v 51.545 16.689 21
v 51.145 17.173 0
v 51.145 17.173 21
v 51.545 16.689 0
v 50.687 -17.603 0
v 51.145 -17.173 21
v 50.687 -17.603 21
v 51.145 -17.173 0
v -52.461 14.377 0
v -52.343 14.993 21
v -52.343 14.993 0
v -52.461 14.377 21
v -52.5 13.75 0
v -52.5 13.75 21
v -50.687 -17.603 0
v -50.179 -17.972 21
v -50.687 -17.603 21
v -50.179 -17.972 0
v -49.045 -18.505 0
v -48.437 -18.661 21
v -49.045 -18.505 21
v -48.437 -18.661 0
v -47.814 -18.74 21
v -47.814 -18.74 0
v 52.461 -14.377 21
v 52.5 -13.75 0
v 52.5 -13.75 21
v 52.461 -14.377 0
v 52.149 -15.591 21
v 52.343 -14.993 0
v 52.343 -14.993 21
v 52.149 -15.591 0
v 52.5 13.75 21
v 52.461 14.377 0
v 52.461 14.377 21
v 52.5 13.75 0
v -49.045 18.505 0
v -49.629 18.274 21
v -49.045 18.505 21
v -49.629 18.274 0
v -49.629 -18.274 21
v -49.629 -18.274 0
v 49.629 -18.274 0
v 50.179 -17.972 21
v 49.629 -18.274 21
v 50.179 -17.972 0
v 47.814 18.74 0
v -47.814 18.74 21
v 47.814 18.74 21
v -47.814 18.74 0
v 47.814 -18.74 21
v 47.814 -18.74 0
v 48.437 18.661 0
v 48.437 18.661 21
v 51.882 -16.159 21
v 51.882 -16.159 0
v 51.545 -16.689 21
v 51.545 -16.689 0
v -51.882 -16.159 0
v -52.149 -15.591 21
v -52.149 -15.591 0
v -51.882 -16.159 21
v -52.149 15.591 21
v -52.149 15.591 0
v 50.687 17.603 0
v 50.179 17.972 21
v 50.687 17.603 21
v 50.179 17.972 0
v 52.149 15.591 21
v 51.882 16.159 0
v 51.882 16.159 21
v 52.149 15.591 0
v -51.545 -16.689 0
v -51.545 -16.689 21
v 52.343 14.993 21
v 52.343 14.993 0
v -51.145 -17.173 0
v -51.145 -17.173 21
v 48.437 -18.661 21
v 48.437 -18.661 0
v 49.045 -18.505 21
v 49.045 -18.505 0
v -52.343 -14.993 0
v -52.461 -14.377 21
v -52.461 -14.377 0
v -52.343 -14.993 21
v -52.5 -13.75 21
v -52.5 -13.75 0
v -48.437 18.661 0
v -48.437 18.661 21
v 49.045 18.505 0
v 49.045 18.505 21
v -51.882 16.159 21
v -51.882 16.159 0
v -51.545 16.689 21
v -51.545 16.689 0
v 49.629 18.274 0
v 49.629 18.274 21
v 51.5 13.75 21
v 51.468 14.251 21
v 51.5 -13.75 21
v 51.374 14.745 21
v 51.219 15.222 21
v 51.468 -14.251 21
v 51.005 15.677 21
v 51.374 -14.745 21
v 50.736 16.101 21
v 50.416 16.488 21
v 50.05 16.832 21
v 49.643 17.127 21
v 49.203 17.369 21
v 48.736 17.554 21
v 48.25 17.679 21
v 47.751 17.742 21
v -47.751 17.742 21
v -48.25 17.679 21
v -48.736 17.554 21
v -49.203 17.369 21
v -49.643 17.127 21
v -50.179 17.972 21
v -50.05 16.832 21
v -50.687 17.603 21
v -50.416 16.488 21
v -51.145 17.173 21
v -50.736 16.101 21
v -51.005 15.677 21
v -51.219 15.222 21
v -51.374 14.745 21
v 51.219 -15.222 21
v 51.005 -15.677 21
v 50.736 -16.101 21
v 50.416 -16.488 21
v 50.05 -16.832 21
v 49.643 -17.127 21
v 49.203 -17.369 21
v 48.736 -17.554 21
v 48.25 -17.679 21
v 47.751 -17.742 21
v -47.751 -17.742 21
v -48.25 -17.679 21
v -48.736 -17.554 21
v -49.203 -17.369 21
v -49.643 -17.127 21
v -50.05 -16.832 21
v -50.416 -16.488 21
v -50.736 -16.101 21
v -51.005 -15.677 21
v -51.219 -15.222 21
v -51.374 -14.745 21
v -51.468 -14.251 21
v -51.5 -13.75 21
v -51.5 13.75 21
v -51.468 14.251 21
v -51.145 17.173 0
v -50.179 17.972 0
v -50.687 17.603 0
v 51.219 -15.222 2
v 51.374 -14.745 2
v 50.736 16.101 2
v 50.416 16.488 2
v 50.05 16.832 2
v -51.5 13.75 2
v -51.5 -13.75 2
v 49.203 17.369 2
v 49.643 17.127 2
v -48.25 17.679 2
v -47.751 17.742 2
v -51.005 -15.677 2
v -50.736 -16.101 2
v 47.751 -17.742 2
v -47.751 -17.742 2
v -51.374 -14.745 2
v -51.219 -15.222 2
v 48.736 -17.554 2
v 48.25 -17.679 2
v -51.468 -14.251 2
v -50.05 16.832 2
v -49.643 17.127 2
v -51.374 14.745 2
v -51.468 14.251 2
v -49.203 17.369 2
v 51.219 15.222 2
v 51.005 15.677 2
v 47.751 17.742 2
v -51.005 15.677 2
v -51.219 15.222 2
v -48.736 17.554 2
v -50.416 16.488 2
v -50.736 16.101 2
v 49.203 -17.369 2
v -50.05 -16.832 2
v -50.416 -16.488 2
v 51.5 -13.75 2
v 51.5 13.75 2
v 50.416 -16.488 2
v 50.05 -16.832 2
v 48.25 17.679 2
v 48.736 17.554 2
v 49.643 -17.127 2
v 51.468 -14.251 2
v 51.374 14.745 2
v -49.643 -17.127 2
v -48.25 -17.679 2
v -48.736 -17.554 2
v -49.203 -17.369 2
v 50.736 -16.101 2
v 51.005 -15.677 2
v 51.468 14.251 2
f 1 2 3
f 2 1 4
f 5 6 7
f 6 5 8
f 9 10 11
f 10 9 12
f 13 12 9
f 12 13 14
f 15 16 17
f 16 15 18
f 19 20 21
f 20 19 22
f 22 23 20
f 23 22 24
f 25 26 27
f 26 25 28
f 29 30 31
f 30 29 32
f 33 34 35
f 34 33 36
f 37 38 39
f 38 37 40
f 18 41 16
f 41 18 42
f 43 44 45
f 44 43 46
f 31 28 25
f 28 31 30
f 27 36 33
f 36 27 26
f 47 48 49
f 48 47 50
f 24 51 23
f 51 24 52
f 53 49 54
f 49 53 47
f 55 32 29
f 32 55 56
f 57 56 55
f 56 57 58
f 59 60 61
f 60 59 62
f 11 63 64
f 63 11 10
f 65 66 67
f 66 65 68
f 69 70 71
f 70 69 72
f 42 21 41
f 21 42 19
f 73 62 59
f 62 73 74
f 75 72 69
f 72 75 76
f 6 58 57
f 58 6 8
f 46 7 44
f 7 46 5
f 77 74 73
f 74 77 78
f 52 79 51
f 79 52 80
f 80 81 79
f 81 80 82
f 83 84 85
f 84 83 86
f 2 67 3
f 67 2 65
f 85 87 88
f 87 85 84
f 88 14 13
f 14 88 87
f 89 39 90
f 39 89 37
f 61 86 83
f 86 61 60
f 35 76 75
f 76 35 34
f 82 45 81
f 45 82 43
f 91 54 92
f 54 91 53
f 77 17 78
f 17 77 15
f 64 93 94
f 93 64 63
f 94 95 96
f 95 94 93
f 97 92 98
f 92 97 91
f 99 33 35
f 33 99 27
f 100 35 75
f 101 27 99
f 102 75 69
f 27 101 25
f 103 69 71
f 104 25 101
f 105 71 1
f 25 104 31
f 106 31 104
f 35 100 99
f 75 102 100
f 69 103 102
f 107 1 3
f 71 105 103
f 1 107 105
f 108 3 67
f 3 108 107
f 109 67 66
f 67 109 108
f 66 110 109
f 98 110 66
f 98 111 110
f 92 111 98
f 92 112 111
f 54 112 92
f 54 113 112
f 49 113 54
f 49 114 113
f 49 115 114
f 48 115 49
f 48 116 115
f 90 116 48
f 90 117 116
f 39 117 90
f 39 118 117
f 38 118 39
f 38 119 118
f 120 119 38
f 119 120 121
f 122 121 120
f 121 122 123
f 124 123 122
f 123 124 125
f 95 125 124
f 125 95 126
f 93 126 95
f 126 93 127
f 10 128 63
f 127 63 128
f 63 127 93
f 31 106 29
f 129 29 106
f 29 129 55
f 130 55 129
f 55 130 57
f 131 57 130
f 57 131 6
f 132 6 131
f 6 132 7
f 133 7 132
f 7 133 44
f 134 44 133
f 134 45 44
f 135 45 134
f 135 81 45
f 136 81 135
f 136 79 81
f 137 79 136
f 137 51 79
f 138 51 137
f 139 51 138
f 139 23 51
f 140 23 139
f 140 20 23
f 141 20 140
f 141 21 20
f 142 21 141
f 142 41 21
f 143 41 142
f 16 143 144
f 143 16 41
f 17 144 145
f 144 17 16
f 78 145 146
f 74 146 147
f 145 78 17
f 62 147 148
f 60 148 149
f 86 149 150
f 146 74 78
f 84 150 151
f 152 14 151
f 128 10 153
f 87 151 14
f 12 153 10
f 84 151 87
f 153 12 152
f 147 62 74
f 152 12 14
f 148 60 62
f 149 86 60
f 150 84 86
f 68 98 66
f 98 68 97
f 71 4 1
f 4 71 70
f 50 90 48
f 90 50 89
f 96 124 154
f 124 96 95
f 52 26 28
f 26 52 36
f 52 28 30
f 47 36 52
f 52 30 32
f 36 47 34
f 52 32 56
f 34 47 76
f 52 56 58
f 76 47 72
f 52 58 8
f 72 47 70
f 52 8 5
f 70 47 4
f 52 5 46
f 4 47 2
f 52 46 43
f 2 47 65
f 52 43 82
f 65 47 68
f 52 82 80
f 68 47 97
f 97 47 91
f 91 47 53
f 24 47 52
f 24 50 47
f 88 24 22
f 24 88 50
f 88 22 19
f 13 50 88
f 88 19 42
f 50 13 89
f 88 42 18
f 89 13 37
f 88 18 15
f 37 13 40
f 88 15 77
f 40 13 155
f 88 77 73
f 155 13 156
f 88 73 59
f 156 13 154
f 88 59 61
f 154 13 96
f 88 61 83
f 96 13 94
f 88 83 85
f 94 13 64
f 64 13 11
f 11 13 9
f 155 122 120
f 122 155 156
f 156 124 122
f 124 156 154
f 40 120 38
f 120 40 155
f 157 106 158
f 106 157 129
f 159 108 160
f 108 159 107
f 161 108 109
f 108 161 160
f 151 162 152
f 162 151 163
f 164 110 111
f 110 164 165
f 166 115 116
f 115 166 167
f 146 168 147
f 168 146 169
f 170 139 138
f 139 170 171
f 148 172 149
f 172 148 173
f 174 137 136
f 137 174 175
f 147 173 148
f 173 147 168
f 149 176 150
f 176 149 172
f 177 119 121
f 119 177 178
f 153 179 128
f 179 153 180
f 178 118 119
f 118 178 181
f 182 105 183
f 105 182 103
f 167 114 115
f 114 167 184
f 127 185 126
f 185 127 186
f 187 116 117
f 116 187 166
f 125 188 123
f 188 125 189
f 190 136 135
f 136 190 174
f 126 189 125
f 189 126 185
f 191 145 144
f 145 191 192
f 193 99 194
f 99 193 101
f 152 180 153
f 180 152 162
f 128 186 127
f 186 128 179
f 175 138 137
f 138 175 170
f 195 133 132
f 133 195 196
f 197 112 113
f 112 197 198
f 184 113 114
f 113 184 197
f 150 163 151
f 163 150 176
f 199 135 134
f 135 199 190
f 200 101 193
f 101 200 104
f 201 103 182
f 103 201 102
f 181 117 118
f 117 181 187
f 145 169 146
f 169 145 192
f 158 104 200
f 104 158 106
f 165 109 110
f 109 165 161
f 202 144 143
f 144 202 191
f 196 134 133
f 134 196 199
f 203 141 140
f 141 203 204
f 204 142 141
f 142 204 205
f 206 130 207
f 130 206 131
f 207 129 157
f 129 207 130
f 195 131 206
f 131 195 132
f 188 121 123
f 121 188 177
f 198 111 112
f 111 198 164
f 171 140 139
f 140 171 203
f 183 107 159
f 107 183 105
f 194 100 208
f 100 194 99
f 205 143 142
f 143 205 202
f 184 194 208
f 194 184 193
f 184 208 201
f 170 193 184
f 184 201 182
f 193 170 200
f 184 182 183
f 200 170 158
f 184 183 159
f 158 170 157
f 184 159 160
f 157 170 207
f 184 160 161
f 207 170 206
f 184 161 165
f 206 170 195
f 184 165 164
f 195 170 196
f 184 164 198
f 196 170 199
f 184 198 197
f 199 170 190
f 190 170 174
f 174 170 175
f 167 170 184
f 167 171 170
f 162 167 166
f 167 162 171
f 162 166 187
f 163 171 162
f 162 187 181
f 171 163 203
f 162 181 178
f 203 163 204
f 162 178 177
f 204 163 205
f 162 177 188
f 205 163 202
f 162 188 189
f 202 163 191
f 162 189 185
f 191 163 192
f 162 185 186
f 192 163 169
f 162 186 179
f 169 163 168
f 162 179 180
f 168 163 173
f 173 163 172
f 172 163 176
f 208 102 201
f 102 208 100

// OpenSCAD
$fn = 50;


difference() {
	union() {
		hull() {
			translate(v = [-47.5000000000, 13.7500000000, 0]) {
				cylinder(h = 21, r = 5);
			}
			translate(v = [47.5000000000, 13.7500000000, 0]) {
				cylinder(h = 21, r = 5);
			}
			translate(v = [-47.5000000000, -13.7500000000, 0]) {
				cylinder(h = 21, r = 5);
			}
			translate(v = [47.5000000000, -13.7500000000, 0]) {
				cylinder(h = 21, r = 5);
			}
		}
	}
	union() {
		translate(v = [0, 0, 2]) {
			hull() {
				translate(v = [-47.5000000000, 13.7500000000, 0]) {
					cylinder(h = 19, r = 4);
				}
				translate(v = [47.5000000000, 13.7500000000, 0]) {
					cylinder(h = 19, r = 4);
				}
				translate(v = [-47.5000000000, -13.7500000000, 0]) {
					cylinder(h = 19, r = 4);
				}
				translate(v = [47.5000000000, -13.7500000000, 0]) {
					cylinder(h = 19, r = 4);
				}
			}
		}
	}
}
